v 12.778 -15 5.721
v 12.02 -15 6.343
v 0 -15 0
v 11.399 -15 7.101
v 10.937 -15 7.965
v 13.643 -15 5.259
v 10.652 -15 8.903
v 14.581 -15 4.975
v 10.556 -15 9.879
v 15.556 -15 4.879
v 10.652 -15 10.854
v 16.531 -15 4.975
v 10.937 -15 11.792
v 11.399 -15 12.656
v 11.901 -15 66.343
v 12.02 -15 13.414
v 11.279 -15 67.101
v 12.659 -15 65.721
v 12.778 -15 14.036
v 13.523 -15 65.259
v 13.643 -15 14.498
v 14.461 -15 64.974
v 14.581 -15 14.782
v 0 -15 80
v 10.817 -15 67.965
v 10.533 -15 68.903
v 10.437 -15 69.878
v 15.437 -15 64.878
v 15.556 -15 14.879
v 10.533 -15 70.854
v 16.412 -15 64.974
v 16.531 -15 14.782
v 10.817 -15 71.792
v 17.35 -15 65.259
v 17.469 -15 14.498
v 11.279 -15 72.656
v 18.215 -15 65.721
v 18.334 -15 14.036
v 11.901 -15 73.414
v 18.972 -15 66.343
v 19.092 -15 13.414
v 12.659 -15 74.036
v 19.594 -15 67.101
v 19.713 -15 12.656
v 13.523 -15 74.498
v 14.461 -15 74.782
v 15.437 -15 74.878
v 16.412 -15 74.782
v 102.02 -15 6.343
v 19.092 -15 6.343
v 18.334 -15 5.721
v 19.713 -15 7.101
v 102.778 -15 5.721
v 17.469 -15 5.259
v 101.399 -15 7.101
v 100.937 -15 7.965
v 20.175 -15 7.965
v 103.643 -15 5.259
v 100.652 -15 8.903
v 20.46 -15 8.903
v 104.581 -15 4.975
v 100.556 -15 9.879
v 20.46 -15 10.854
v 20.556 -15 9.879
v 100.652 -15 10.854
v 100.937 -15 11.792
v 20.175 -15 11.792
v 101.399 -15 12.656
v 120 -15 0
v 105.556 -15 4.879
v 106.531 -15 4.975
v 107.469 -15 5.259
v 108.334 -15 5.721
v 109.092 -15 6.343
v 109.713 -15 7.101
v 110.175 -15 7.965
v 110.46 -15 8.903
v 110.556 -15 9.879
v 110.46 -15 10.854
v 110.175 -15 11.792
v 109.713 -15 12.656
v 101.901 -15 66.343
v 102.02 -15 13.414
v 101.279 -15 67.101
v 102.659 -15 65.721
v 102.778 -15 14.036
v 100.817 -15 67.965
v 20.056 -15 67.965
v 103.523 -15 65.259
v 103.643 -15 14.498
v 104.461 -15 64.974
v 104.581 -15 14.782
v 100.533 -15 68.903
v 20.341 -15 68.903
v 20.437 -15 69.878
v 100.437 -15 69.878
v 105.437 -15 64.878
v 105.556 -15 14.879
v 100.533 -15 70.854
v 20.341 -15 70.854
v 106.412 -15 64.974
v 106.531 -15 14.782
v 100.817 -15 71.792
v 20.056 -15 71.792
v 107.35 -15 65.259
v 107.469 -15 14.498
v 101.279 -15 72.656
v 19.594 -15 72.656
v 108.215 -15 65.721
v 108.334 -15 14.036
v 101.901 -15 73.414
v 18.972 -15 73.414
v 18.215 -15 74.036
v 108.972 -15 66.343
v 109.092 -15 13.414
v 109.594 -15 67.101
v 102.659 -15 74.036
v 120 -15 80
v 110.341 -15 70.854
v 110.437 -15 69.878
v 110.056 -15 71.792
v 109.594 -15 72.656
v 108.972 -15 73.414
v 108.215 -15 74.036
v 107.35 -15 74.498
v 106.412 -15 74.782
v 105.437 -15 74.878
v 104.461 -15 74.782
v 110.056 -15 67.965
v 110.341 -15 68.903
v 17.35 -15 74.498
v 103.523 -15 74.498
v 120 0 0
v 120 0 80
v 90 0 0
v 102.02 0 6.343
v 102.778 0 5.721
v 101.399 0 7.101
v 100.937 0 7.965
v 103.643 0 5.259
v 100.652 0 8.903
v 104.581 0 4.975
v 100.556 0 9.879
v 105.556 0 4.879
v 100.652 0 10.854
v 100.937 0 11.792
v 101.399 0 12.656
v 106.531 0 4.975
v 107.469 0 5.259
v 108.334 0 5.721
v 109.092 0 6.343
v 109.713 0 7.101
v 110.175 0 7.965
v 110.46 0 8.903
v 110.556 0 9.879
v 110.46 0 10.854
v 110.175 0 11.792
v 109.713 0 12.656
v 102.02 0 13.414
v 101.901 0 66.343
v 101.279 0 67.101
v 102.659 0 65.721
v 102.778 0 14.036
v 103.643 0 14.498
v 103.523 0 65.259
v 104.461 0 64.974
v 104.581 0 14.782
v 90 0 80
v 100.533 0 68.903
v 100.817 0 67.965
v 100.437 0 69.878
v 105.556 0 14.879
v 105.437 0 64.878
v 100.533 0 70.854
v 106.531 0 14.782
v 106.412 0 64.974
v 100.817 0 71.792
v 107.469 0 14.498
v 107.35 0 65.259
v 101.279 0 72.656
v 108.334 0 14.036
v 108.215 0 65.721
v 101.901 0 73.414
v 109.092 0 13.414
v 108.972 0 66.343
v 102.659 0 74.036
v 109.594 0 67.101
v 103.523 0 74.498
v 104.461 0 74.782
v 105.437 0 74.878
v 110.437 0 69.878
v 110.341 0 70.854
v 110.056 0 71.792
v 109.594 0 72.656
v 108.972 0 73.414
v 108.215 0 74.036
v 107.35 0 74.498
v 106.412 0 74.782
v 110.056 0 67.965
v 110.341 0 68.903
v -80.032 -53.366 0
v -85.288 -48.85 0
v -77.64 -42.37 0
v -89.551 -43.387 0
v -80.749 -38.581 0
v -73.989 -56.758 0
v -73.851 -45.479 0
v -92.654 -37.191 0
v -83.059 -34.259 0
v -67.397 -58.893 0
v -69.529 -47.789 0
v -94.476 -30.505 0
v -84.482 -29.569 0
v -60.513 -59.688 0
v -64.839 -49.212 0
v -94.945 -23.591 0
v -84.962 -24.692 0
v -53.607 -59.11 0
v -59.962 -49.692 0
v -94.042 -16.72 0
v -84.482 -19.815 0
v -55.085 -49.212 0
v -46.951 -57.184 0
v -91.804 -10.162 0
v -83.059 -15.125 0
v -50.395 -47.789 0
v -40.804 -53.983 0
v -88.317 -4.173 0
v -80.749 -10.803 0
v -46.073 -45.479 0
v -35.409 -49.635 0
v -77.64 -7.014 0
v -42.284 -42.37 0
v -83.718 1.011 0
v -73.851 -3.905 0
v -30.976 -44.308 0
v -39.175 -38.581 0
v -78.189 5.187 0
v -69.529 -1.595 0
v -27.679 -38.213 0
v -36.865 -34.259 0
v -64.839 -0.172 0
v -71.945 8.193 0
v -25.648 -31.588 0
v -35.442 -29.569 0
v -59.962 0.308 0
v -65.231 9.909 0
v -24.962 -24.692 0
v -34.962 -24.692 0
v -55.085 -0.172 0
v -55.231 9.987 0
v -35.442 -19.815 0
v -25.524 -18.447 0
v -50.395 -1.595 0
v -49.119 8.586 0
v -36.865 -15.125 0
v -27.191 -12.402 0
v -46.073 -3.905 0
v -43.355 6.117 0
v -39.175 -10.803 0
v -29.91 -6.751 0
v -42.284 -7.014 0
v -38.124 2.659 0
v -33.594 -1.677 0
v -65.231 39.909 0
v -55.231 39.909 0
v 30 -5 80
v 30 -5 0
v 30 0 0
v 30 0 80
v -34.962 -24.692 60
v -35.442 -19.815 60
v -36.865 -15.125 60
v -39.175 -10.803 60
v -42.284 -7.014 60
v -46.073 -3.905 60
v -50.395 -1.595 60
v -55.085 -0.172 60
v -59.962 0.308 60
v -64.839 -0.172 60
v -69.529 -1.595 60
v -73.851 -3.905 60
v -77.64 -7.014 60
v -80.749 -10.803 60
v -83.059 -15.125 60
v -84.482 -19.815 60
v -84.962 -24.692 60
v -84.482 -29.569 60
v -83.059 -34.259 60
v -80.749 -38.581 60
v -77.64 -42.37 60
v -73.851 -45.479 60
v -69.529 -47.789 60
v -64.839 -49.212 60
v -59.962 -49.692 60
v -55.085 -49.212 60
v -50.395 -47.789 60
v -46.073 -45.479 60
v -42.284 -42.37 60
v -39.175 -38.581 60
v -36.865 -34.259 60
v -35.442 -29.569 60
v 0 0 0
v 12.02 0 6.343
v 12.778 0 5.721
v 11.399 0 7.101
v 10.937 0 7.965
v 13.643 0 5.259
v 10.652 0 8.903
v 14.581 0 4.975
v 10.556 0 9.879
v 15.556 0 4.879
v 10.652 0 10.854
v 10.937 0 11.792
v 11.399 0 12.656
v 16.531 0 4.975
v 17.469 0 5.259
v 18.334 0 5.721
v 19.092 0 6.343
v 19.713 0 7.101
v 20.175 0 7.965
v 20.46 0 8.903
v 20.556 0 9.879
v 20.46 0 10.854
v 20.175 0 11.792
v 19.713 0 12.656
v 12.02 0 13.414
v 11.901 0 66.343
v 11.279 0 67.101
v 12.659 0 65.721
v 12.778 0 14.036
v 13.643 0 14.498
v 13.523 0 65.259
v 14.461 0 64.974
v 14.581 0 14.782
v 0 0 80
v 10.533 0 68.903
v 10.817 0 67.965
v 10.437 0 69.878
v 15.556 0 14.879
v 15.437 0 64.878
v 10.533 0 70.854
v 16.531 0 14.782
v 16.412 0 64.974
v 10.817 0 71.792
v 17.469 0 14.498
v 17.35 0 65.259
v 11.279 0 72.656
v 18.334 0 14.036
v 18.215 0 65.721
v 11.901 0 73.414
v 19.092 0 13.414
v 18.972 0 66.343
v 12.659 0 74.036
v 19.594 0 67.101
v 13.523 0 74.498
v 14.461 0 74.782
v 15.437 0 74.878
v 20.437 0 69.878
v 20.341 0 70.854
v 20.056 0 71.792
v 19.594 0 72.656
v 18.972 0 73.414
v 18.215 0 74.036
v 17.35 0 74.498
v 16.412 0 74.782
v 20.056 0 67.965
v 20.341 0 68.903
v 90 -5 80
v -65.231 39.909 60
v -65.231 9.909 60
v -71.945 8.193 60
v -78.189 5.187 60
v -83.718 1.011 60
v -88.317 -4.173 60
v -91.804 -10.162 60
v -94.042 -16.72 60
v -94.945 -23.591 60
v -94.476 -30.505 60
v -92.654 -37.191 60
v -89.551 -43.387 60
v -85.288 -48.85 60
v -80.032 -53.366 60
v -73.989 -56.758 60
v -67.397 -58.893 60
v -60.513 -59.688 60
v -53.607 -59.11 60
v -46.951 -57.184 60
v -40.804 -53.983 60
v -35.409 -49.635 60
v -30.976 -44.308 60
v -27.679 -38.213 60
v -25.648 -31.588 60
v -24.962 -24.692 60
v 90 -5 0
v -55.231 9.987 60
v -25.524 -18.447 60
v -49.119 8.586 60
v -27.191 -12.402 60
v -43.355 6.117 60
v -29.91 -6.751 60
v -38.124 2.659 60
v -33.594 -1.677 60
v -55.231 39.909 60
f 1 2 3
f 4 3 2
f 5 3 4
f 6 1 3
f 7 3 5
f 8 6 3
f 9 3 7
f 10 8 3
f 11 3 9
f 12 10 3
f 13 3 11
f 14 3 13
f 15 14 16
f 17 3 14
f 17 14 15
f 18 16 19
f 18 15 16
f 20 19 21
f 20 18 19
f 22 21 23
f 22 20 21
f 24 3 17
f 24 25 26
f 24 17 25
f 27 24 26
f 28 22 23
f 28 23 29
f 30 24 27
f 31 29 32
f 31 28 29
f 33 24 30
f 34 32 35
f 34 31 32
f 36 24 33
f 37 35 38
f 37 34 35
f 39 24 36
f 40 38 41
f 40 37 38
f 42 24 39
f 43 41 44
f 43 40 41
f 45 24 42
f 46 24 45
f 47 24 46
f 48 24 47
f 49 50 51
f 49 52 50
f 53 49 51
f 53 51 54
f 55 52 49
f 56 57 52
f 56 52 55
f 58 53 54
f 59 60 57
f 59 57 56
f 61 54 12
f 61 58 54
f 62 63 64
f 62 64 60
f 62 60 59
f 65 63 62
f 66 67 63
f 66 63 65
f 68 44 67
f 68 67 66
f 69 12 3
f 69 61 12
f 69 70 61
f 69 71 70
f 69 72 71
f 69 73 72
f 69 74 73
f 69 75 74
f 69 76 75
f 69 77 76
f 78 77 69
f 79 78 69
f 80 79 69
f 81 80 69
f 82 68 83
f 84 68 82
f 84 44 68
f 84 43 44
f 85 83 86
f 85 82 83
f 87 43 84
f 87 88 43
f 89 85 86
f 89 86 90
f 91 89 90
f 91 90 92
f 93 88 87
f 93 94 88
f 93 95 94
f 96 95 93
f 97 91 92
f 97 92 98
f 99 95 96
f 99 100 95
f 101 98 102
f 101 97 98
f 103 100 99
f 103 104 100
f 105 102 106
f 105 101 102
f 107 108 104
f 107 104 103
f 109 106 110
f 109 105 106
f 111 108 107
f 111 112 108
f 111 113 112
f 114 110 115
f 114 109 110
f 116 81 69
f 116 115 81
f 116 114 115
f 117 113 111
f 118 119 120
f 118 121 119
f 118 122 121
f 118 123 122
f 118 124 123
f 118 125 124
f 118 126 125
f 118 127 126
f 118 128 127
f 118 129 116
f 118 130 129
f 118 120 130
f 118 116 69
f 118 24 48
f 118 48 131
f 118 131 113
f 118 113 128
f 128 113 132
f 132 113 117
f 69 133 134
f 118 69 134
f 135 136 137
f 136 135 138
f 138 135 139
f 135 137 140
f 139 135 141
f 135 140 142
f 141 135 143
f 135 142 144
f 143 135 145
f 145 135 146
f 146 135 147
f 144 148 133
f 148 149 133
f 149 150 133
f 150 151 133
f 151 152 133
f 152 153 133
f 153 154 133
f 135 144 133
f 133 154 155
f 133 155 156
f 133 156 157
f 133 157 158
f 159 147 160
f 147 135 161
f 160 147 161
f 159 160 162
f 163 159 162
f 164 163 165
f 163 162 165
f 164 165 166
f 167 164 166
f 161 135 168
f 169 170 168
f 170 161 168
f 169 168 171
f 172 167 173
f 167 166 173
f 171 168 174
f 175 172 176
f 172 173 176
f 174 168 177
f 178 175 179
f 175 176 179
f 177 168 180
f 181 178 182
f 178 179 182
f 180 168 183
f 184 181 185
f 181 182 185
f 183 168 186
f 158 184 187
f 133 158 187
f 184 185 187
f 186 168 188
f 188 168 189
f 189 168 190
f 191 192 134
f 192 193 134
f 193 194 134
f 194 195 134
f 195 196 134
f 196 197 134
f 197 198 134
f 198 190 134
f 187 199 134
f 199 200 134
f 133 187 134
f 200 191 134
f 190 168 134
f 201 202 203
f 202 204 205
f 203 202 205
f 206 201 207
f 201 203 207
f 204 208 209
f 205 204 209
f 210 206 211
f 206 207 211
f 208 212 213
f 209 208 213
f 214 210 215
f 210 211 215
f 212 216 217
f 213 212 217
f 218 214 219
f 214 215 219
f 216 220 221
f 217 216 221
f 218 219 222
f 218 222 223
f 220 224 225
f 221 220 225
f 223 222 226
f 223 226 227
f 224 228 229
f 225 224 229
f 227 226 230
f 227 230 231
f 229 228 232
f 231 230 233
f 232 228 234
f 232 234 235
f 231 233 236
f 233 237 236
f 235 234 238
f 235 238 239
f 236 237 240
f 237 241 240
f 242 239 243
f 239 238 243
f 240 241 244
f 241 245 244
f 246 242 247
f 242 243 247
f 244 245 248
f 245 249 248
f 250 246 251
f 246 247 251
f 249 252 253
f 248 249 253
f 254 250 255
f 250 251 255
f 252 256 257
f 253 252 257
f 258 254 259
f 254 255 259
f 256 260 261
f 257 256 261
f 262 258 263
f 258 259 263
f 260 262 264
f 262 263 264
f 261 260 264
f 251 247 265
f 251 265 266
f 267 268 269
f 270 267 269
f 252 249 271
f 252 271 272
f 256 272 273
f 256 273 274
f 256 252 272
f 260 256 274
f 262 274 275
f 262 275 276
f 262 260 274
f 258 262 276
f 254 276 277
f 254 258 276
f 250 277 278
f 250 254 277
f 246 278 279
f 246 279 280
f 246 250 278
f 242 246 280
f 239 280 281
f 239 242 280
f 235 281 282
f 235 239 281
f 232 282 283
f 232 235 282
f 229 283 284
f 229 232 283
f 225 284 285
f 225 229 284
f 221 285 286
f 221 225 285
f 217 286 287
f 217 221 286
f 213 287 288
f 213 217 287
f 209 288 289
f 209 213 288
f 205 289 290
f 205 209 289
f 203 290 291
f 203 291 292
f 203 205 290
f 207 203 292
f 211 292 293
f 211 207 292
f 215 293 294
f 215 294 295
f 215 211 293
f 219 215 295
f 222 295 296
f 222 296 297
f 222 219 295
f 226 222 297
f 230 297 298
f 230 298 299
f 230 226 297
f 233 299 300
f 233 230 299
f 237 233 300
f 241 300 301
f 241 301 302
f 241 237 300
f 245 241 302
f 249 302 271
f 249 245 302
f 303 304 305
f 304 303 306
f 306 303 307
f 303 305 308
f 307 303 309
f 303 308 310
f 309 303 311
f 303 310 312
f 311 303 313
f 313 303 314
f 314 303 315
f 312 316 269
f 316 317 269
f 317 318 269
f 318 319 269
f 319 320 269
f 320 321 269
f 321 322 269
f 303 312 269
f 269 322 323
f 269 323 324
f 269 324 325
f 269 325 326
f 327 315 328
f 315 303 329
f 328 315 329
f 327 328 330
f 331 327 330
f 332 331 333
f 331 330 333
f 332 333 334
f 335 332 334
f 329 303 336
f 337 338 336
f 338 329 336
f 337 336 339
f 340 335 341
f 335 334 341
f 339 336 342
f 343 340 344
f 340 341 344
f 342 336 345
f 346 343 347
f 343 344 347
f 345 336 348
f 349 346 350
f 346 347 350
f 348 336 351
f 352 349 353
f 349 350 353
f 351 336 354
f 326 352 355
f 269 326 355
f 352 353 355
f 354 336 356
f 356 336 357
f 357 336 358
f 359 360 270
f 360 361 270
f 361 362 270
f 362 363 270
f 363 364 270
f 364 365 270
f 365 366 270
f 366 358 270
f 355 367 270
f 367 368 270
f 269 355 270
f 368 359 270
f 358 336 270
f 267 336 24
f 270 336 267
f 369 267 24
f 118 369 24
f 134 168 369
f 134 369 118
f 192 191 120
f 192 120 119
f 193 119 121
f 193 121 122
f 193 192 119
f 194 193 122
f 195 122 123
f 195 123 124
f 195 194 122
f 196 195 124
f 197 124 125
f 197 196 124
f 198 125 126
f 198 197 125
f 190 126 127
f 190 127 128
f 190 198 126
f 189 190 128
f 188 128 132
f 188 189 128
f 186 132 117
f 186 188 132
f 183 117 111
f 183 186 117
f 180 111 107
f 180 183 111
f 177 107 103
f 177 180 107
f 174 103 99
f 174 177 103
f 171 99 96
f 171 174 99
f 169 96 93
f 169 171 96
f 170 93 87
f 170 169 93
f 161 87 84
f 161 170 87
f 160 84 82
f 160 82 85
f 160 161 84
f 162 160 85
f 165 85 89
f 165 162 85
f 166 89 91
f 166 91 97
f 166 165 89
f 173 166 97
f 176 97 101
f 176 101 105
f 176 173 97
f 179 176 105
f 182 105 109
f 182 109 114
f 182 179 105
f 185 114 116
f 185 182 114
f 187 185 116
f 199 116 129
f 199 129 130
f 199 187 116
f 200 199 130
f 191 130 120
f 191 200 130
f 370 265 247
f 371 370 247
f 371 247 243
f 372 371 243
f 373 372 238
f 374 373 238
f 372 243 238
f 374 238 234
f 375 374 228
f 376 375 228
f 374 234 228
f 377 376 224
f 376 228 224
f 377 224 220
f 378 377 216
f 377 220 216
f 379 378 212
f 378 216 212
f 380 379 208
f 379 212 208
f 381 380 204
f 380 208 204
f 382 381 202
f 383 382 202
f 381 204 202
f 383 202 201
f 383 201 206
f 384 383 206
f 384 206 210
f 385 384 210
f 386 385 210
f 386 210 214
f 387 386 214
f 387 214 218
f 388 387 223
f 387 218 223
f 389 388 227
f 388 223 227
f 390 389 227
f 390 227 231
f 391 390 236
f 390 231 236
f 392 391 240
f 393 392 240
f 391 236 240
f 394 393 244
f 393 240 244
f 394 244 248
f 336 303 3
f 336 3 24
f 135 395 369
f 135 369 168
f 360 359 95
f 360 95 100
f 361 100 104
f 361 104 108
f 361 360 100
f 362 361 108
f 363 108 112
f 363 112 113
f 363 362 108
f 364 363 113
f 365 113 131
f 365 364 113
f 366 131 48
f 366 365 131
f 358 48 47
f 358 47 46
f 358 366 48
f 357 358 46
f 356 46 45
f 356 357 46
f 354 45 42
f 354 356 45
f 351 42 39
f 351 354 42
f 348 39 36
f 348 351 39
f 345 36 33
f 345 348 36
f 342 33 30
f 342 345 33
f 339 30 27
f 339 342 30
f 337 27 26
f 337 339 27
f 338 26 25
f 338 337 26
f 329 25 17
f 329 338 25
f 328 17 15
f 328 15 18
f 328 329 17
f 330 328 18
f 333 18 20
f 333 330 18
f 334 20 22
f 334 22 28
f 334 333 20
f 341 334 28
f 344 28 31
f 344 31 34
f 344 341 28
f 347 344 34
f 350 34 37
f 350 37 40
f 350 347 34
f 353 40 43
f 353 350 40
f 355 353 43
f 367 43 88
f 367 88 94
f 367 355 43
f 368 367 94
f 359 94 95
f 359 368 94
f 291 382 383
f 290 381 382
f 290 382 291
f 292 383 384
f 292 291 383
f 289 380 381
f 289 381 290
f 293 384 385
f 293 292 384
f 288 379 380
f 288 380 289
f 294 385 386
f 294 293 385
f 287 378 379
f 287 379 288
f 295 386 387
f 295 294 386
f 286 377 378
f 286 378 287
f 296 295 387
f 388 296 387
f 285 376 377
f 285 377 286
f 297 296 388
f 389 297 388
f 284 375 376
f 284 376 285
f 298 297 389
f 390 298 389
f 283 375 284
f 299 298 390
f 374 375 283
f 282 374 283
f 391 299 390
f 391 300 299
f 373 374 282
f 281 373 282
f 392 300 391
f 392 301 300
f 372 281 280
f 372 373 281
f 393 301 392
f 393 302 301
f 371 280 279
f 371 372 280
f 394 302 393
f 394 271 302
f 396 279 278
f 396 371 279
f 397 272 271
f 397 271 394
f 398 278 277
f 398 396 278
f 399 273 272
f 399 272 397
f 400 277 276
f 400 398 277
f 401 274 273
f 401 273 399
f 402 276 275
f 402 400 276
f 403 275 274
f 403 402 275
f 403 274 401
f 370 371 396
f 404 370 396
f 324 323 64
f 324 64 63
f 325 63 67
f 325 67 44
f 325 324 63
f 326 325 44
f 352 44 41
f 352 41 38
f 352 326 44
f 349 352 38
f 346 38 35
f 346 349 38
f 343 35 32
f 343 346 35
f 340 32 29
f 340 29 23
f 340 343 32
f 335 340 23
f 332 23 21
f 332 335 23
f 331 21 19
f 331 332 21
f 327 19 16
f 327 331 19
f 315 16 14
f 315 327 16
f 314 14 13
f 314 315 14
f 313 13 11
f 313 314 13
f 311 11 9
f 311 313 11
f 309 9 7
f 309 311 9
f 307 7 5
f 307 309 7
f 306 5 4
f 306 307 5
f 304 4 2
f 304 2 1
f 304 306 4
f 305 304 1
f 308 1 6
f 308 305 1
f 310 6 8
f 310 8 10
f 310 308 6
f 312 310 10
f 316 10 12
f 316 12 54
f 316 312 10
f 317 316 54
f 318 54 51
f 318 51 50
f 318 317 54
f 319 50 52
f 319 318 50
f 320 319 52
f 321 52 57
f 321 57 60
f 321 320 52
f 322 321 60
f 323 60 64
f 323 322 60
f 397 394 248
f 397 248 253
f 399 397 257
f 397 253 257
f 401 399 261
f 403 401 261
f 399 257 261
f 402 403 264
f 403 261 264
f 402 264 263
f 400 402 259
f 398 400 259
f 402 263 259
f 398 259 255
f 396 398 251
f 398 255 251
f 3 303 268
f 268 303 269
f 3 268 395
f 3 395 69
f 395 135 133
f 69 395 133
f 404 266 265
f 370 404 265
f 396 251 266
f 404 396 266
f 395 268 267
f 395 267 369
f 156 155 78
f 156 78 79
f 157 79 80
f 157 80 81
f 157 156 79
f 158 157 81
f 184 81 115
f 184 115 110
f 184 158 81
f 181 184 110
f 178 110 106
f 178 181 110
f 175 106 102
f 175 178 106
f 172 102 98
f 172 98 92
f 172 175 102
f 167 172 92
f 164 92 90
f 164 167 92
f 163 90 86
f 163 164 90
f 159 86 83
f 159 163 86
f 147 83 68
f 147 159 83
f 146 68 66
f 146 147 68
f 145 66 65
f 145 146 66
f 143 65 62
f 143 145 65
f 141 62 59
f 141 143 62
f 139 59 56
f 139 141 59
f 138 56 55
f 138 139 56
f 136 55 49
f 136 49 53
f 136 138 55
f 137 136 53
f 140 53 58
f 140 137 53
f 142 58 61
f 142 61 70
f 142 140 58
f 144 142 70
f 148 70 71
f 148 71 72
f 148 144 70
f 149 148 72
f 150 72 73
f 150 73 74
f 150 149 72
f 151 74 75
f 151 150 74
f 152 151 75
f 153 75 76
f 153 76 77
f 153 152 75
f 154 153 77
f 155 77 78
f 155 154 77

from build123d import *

# Parameters (mm, degrees)
F0_W      = 120
F0_H      = 80
F0_R      = 5
F1_DEPTH  = 15
F3_W      = 60
F3_H      = 5
F4_DEPTH  = 120
F5_W      = 10
F5_H      = 70.017156493
F6_DEPTH  = 40
F7_W      = 10.0020468235
F7_H      = 5.0063221715
F8_DEPTH  = 90
F10_R     = 25
F11_DEPTH = 60


with BuildPart() as f1:
    # F0 (on Front) → F1 (new body)
    with BuildSketch(Plane.XZ):
        with Locations((60, 40)):
            Rectangle(F0_W, F0_H)
        with Locations((15.5560296093, 9.8785167499)):
            Circle(F0_R, mode=Mode.SUBTRACT)
        with Locations((105.5560296093, 9.8785167499)):
            Circle(F0_R, mode=Mode.SUBTRACT)
        with Locations((15.4366883606, 69.8783980637)):
            Circle(F0_R, mode=Mode.SUBTRACT)
        with Locations((105.4366883606, 69.8783980637)):
            Circle(F0_R, mode=Mode.SUBTRACT)
    extrude(amount=F1_DEPTH)

    # F3 (on Top) → F4 (cut)
    with BuildSketch(Plane.XY):
        with Locations((60, -2.5)):
            Rectangle(F3_W, F3_H)
    extrude(amount=F4_DEPTH, mode=Mode.SUBTRACT)

    # F7 (on Top) → F8 (cut)
    with BuildSketch(Plane.XY):
        with Locations((84.9899873137, -2.5031610858)):
            Rectangle(F7_W, F7_H)
    extrude(amount=-F8_DEPTH, mode=Mode.SUBTRACT)


with BuildPart() as f1b:
    # F0 (on Front) → F1, piece 2 (new body)
    with BuildSketch(Plane.XZ):
        with Locations((195.5560296093, 9.8785167499)):
            Circle(F0_R)
    extrude(amount=F1_DEPTH)


with BuildPart() as f6:
    # F5 (on Front) → F6 (new body)
    with BuildSketch(Plane.XZ):
        with Locations((85, 39.9975791806)):
            Rectangle(F5_W, F5_H)
    extrude(amount=F6_DEPTH)


with BuildPart() as f11:
    # F10 (on Top) → F11 (new body)
    with BuildSketch(Plane.XY):
        with BuildLine():
            Line((-55.2309811049, 9.9091004567), (-65.2309811049, 9.9091004567))
            ThreePointArc((-65.2309811049, 9.9091004567), (-82.7720530048, -51.238329576), (-24.9620901048, -24.6920380741))
            ThreePointArc((-24.9620901048, -24.6920380741), (-33.5936542866, -1.6767042182), (-55.2309811049, 9.9867249896))
            Line((-55.2309811049, 9.9867249896), (-55.2309811049, 9.9091004567))
        make_face()
        with Locations((-59.9620901048, -24.6920380741)):
            Circle(F10_R, mode=Mode.SUBTRACT)
        with BuildLine():
            Line((-65.2309811049, 39.9091004567), (-65.2309811049, 9.9091004567))
            ThreePointArc((-65.2309811049, 9.9091004567), (-60.2337677851, 10.3069074991), (-55.2309811049, 9.9867249896))
            Line((-55.2309811049, 9.9867249896), (-55.2309811049, 39.9091004567))
            Line((-55.2309811049, 39.9091004567), (-65.2309811049, 39.9091004567))
        make_face()
        with BuildLine():
            ThreePointArc((-55.2309811049, 9.9867249896), (-60.2337677851, 10.3069074991), (-65.2309811049, 9.9091004567))
            Line((-65.2309811049, 9.9091004567), (-55.2309811049, 9.9091004567))
            Line((-55.2309811049, 9.9091004567), (-55.2309811049, 9.9867249896))
        make_face()
    extrude(amount=F11_DEPTH)


solid = Compound([f1.part, f11.part])
